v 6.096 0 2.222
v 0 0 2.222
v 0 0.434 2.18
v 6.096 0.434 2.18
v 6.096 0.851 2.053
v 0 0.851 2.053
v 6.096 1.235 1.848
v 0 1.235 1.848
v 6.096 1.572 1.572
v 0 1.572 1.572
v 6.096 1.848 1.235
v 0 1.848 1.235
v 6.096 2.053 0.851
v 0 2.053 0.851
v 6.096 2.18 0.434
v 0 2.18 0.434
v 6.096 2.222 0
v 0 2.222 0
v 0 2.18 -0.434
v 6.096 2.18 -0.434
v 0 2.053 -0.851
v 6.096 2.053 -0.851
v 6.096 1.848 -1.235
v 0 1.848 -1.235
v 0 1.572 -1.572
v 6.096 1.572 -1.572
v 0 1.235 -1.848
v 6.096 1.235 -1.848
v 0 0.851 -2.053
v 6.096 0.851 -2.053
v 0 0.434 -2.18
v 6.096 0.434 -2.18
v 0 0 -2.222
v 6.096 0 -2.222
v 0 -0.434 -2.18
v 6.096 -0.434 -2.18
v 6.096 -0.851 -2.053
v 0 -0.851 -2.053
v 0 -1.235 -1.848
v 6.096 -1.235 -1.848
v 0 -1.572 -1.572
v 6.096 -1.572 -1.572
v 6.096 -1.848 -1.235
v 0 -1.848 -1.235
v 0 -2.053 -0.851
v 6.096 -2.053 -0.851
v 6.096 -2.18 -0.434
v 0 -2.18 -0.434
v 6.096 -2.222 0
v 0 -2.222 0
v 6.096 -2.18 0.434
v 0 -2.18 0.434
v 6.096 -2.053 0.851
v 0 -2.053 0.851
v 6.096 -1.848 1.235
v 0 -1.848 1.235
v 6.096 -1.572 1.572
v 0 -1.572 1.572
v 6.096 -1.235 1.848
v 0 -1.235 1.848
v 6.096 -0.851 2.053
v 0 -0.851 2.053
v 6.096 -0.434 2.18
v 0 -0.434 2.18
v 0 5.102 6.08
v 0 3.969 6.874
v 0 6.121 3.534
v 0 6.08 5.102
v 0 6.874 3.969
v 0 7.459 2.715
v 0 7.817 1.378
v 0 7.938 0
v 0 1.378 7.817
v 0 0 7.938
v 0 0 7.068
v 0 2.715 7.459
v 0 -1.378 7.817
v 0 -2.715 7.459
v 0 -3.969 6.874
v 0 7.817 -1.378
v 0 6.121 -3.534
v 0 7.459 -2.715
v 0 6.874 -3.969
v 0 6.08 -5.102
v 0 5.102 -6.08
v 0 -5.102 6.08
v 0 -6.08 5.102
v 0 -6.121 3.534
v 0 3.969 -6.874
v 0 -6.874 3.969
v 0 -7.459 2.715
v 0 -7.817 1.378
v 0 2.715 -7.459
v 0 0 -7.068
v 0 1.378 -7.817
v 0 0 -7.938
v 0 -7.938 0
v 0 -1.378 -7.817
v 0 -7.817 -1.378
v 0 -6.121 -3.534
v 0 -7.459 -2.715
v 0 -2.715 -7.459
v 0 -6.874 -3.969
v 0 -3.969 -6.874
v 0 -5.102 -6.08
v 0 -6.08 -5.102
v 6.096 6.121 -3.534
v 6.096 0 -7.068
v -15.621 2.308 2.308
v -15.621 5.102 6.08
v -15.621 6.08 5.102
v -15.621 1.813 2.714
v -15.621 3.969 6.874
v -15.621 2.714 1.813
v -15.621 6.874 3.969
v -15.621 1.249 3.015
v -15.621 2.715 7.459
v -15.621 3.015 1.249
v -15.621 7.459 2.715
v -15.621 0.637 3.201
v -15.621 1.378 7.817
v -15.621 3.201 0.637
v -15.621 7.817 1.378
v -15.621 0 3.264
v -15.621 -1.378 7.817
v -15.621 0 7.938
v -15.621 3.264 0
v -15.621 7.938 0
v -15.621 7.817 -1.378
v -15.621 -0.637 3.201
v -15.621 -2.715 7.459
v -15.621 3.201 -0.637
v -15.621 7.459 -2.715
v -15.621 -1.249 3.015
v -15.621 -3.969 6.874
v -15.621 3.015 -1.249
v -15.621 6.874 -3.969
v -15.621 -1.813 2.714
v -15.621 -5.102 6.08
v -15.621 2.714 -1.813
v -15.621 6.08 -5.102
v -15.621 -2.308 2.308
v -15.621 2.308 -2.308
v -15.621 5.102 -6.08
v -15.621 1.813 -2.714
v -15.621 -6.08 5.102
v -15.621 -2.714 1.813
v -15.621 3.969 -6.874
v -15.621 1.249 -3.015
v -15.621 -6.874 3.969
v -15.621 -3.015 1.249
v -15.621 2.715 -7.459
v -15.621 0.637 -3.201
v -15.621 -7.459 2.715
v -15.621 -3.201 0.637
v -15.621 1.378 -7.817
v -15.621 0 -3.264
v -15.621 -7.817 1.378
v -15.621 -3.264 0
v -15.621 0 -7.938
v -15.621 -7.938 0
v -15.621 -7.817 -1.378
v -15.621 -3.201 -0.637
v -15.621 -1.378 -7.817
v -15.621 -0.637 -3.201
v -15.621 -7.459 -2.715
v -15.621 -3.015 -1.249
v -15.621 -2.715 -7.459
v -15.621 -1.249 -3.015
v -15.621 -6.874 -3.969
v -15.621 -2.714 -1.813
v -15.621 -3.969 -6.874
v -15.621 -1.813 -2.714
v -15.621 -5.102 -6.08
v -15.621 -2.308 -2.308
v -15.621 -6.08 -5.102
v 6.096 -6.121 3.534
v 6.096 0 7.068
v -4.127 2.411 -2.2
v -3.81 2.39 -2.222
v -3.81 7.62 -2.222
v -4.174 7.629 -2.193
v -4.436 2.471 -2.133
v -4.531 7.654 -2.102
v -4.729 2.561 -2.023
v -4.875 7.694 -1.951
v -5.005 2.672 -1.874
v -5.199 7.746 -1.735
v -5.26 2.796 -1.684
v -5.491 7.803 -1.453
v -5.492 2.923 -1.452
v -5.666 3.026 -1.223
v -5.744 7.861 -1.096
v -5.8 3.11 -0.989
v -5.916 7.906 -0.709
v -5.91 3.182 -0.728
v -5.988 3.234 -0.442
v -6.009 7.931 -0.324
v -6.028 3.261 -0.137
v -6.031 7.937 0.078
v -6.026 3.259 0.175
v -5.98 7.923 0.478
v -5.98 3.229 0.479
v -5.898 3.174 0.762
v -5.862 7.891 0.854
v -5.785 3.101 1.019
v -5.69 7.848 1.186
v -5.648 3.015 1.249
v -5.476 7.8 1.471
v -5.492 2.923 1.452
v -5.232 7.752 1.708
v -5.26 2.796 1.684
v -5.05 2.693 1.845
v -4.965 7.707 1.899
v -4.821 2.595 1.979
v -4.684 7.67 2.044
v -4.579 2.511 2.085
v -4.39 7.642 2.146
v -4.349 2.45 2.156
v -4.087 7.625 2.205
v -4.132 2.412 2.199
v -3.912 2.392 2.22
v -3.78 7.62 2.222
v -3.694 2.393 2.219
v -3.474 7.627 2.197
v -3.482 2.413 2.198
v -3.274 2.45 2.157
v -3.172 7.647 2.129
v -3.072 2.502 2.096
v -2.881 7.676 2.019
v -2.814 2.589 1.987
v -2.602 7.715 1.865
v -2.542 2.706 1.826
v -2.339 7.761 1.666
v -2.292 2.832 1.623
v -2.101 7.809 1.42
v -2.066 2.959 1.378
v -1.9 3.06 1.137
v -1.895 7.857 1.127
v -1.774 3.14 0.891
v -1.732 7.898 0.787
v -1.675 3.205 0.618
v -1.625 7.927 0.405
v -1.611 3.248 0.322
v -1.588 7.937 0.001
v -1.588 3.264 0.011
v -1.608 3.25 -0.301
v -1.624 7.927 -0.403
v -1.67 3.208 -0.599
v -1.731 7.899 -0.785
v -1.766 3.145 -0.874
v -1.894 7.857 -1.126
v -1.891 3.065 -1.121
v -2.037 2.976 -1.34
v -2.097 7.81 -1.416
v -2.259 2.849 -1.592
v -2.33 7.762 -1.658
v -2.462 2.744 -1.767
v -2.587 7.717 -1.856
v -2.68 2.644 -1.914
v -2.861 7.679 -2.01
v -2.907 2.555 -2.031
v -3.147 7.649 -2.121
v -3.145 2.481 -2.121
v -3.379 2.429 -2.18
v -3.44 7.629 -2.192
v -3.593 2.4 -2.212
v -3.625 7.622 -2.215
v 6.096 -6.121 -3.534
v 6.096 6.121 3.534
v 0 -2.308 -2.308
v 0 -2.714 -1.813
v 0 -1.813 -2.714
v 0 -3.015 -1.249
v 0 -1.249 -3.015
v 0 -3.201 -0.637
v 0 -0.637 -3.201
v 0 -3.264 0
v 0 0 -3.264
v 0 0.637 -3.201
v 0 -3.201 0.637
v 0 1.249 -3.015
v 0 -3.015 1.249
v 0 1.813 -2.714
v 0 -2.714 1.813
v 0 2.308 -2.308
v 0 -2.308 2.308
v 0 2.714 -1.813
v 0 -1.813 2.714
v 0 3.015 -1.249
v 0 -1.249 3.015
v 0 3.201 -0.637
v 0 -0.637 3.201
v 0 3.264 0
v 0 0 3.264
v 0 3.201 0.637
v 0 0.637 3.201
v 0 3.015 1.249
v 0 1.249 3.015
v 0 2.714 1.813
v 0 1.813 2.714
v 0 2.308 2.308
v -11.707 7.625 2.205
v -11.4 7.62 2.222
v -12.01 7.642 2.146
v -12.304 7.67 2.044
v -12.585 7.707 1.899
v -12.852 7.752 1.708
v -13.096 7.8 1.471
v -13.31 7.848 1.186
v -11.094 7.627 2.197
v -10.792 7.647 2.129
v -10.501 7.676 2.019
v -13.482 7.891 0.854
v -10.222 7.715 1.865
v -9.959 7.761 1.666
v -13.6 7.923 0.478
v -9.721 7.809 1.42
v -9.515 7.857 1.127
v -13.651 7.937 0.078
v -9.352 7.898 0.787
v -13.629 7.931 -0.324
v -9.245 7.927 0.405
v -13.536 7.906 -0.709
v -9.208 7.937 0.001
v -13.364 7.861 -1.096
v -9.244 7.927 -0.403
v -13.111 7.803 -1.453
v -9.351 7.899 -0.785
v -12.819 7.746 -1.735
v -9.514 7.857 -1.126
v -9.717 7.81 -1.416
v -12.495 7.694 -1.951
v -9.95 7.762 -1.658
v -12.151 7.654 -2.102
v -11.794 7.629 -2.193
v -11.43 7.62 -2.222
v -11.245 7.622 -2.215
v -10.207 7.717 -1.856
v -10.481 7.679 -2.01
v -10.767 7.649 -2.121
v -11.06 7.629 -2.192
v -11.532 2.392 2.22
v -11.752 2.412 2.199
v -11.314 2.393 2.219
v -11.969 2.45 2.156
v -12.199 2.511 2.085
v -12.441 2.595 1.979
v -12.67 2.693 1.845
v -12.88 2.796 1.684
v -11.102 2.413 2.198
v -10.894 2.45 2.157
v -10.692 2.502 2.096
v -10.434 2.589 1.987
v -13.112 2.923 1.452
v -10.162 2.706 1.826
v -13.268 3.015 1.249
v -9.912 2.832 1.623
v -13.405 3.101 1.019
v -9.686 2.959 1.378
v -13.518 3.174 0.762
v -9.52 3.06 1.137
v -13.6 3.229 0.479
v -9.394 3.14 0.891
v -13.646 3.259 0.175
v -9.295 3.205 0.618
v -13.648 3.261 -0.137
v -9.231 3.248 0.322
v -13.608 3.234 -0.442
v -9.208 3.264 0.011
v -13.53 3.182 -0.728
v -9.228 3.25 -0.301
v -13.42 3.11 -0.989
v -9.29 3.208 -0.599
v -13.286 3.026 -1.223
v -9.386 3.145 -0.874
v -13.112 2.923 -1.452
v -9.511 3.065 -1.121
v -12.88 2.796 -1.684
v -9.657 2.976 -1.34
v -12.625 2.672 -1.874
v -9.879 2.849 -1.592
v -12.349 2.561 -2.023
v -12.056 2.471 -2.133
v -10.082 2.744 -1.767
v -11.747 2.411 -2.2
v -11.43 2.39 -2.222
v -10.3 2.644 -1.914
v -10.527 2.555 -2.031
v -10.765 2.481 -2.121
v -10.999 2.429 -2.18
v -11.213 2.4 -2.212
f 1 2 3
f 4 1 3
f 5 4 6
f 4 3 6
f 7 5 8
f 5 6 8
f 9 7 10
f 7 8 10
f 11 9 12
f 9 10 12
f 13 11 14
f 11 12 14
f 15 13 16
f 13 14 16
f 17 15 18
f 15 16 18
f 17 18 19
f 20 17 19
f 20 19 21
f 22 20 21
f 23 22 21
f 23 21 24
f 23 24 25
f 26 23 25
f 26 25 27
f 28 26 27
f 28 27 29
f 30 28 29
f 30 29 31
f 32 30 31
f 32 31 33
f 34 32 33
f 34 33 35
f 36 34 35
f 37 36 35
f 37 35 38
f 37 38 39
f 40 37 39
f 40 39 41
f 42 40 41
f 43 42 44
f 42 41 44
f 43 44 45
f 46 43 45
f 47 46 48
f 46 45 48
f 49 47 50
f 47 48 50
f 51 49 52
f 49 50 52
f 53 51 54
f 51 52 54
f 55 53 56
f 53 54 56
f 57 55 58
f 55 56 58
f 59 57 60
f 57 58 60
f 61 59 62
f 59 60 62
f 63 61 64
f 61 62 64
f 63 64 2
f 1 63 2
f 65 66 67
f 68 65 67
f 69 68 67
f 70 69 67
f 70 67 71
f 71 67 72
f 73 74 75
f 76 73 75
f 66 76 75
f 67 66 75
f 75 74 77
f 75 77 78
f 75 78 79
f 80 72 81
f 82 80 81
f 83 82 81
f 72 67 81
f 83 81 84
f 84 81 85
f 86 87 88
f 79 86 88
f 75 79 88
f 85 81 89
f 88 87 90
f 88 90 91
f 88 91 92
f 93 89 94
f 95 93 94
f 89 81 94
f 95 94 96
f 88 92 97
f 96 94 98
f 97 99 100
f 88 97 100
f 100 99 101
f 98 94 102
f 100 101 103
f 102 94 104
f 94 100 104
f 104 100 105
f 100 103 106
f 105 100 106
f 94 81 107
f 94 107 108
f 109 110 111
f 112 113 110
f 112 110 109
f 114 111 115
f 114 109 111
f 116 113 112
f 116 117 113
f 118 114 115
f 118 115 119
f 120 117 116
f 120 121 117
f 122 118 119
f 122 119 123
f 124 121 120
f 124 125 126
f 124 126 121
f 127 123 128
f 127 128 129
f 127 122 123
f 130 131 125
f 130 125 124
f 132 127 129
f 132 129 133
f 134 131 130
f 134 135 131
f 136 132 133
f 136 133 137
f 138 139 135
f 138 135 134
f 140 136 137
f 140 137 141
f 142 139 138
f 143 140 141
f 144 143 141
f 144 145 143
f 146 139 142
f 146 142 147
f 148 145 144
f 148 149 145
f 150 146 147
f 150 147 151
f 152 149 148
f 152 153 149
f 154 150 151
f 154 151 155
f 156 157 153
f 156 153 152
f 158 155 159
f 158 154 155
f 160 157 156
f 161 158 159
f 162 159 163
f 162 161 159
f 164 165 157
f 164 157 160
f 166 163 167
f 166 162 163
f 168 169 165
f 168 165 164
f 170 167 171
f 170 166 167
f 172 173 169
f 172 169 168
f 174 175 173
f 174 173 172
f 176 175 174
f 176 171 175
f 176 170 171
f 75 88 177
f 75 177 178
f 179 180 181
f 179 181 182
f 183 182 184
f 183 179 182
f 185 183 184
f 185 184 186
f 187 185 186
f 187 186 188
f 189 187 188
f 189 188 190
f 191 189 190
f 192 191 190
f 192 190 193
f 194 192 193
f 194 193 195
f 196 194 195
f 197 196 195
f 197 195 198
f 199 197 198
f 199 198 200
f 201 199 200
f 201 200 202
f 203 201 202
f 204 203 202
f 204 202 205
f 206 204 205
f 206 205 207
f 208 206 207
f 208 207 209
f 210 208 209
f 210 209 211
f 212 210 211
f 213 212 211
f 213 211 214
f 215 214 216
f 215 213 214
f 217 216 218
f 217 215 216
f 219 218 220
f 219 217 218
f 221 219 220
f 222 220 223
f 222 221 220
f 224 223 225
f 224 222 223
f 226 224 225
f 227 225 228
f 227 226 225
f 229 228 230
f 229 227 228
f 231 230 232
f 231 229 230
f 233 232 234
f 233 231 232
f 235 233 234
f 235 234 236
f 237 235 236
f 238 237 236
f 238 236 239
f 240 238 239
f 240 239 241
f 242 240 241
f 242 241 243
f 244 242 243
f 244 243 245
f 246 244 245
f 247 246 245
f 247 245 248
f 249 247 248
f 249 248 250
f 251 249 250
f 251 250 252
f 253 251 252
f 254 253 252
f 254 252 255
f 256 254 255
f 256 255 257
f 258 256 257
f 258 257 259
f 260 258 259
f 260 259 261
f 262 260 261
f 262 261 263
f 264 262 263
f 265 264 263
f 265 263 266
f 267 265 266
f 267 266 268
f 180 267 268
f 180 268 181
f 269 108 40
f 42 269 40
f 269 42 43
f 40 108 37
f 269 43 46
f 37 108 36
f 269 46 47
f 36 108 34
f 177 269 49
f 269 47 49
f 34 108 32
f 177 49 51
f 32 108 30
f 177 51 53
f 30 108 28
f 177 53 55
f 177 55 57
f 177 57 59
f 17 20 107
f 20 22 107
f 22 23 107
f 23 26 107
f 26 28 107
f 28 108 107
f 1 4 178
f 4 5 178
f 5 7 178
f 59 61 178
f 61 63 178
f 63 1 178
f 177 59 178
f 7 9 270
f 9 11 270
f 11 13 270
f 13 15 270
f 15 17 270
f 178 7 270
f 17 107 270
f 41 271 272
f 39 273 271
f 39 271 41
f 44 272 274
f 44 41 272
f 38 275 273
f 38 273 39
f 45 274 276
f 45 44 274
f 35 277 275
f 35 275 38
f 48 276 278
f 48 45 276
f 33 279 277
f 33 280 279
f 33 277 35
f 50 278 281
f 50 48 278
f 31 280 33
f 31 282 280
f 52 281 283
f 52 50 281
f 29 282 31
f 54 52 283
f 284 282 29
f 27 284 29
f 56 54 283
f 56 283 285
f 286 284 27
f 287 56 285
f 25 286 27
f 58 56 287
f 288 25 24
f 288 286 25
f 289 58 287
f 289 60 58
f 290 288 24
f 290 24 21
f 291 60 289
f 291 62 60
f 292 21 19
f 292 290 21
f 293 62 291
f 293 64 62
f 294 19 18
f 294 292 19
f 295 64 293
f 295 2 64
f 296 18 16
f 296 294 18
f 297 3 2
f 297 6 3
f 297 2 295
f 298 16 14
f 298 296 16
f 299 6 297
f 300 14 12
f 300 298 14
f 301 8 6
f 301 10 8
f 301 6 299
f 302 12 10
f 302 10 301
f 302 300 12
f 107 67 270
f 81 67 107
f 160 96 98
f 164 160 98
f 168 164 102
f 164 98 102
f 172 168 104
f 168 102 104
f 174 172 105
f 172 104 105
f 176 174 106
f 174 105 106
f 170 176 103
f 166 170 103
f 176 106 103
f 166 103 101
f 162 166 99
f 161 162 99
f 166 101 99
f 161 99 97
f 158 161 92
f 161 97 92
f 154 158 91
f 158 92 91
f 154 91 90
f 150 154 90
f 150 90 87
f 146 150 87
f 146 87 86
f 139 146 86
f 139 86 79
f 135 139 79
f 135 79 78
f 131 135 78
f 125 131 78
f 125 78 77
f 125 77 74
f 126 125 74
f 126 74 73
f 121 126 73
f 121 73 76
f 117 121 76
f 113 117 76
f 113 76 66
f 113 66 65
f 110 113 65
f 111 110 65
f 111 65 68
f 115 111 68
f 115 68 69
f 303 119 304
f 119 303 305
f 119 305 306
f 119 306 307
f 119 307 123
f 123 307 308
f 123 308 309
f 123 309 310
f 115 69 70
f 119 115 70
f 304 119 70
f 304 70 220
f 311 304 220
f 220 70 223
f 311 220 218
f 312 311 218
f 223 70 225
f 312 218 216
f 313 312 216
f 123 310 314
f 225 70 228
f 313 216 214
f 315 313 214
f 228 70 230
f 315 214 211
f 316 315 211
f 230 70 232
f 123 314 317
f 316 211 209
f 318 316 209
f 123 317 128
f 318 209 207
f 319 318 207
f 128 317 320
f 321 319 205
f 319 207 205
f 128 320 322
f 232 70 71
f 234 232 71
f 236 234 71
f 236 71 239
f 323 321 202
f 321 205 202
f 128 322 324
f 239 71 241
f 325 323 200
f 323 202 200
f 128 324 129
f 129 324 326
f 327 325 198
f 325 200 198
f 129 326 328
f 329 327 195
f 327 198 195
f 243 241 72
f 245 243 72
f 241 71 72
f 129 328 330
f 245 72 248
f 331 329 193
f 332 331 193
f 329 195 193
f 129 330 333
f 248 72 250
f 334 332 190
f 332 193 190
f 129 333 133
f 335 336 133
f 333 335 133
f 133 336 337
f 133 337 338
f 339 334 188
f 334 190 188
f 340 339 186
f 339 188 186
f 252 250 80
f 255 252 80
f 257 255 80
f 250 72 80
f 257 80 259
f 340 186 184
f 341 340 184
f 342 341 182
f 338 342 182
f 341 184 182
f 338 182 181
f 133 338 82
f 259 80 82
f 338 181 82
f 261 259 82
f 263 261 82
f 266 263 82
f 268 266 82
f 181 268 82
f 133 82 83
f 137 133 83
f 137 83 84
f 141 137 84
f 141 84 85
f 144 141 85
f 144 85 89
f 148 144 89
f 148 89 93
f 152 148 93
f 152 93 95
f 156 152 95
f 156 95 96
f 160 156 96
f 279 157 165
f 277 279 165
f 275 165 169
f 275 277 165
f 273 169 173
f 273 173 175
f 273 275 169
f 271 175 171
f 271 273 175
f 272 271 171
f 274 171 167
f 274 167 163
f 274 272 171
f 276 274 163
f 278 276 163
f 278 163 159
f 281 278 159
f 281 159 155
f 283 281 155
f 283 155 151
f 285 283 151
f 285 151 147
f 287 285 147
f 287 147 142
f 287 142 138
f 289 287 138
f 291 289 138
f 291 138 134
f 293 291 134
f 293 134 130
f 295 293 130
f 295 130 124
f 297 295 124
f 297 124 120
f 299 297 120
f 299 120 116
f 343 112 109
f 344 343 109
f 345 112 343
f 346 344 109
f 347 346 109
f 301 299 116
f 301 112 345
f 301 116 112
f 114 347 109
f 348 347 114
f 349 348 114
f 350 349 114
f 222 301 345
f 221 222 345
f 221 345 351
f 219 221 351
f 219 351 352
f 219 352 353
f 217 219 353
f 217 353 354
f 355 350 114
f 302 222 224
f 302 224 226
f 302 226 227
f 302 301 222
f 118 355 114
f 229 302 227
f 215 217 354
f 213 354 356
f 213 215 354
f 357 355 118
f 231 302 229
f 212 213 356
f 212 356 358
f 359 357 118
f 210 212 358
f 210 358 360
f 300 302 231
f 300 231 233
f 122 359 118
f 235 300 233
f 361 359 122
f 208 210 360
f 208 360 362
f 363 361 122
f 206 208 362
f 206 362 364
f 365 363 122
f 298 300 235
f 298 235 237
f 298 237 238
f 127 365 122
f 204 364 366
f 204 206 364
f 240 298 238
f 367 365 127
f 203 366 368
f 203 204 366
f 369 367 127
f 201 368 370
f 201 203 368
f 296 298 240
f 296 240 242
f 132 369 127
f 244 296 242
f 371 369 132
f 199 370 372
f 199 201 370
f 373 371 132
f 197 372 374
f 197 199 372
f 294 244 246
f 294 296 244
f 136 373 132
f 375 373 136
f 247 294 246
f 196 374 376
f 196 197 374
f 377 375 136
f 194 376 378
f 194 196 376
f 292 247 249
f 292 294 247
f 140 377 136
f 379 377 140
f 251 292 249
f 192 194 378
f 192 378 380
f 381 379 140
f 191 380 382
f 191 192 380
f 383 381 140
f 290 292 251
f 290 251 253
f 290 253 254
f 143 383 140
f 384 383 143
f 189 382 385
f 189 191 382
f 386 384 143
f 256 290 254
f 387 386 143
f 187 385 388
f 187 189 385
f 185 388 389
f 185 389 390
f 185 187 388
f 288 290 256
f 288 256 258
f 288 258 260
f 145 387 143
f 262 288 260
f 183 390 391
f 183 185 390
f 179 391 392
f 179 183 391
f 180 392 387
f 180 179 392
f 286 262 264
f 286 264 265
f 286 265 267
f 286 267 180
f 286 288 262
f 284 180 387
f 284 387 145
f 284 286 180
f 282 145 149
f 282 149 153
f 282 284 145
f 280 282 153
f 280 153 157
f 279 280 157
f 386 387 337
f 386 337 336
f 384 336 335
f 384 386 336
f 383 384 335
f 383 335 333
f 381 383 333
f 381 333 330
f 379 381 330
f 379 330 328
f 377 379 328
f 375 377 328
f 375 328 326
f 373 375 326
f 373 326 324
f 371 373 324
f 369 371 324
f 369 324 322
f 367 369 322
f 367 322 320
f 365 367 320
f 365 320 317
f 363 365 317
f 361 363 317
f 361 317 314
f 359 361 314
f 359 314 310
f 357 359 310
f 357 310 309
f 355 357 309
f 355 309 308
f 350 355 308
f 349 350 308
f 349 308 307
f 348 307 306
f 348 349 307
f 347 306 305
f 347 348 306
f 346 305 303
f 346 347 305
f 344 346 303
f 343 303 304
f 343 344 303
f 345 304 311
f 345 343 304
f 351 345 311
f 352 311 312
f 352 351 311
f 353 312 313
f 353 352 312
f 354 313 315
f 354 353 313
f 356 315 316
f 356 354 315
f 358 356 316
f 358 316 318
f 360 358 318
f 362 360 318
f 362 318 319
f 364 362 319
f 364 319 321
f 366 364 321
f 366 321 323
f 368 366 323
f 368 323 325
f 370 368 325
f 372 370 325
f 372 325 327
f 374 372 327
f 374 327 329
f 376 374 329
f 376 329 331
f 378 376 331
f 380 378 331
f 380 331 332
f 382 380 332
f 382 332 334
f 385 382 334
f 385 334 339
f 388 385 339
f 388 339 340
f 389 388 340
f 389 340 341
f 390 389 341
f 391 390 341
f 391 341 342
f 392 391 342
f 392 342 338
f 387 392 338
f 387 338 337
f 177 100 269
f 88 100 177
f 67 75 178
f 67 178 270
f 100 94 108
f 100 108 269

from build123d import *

# Parameters (mm, degrees)
HEX_2_DEPTH                = 6.096
SKETCH2_R                  = 7.9375
SKETCH2_R_2                = 3.2639
ROTARY_SHAFT_DEPTH         = 15.621
SKETCH3_R                  = 2.2225
SHAFT_SETSCREW_HOLES_DEPTH = 20.235993697
SKETCH4_R                  = 2.2225
CUT_EXTRUDE2_DEPTH         = 20.235993861


with BuildPart() as part:
    # Sketch1 → Hex 2 (new body)
    with BuildSketch(Plane(origin=(0, 0, 0), x_dir=(0, 0, -1), z_dir=(1, 0, 0))):
        Polygon((-3.534191938, 6.1214), (3.534191938, 6.1214), (7.068383876, 0), (3.534191938, -6.1214), (-3.534191938, -6.1214), (-7.068383876, 0), align=None)
    extrude(amount=HEX_2_DEPTH)

    # Sketch2 → Rotary_Shaft (add)
    with BuildSketch(Plane.ZY):
        with Locations(Location((0, 0, 0), (0, 0, 180))):
            Circle(SKETCH2_R)
        with Locations(Location((0, 0, 0), (0, 0, 180))):
            Circle(SKETCH2_R_2, mode=Mode.SUBTRACT)
    extrude(amount=ROTARY_SHAFT_DEPTH)

    # Sketch3 → Shaft-SetScrew-Holes (cut, through all)
    with BuildSketch(Plane(origin=(0, 0, 0), x_dir=(1, 0, 0), z_dir=(0, 1, 0))):
        with Locations(Location((-11.43, 0, 0), (0, 0, 90))):
            Circle(SKETCH3_R)
        with Locations(Location((-3.81, 0, 0), (0, 0, 90))):
            Circle(SKETCH3_R)
    extrude(amount=SHAFT_SETSCREW_HOLES_DEPTH, mode=Mode.SUBTRACT)

    # Sketch4 → Cut-Extrude2 (cut, through all)
    with BuildSketch(Plane.ZY):
        Circle(SKETCH4_R)
    extrude(amount=-CUT_EXTRUDE2_DEPTH, mode=Mode.SUBTRACT)


solid = part.part
